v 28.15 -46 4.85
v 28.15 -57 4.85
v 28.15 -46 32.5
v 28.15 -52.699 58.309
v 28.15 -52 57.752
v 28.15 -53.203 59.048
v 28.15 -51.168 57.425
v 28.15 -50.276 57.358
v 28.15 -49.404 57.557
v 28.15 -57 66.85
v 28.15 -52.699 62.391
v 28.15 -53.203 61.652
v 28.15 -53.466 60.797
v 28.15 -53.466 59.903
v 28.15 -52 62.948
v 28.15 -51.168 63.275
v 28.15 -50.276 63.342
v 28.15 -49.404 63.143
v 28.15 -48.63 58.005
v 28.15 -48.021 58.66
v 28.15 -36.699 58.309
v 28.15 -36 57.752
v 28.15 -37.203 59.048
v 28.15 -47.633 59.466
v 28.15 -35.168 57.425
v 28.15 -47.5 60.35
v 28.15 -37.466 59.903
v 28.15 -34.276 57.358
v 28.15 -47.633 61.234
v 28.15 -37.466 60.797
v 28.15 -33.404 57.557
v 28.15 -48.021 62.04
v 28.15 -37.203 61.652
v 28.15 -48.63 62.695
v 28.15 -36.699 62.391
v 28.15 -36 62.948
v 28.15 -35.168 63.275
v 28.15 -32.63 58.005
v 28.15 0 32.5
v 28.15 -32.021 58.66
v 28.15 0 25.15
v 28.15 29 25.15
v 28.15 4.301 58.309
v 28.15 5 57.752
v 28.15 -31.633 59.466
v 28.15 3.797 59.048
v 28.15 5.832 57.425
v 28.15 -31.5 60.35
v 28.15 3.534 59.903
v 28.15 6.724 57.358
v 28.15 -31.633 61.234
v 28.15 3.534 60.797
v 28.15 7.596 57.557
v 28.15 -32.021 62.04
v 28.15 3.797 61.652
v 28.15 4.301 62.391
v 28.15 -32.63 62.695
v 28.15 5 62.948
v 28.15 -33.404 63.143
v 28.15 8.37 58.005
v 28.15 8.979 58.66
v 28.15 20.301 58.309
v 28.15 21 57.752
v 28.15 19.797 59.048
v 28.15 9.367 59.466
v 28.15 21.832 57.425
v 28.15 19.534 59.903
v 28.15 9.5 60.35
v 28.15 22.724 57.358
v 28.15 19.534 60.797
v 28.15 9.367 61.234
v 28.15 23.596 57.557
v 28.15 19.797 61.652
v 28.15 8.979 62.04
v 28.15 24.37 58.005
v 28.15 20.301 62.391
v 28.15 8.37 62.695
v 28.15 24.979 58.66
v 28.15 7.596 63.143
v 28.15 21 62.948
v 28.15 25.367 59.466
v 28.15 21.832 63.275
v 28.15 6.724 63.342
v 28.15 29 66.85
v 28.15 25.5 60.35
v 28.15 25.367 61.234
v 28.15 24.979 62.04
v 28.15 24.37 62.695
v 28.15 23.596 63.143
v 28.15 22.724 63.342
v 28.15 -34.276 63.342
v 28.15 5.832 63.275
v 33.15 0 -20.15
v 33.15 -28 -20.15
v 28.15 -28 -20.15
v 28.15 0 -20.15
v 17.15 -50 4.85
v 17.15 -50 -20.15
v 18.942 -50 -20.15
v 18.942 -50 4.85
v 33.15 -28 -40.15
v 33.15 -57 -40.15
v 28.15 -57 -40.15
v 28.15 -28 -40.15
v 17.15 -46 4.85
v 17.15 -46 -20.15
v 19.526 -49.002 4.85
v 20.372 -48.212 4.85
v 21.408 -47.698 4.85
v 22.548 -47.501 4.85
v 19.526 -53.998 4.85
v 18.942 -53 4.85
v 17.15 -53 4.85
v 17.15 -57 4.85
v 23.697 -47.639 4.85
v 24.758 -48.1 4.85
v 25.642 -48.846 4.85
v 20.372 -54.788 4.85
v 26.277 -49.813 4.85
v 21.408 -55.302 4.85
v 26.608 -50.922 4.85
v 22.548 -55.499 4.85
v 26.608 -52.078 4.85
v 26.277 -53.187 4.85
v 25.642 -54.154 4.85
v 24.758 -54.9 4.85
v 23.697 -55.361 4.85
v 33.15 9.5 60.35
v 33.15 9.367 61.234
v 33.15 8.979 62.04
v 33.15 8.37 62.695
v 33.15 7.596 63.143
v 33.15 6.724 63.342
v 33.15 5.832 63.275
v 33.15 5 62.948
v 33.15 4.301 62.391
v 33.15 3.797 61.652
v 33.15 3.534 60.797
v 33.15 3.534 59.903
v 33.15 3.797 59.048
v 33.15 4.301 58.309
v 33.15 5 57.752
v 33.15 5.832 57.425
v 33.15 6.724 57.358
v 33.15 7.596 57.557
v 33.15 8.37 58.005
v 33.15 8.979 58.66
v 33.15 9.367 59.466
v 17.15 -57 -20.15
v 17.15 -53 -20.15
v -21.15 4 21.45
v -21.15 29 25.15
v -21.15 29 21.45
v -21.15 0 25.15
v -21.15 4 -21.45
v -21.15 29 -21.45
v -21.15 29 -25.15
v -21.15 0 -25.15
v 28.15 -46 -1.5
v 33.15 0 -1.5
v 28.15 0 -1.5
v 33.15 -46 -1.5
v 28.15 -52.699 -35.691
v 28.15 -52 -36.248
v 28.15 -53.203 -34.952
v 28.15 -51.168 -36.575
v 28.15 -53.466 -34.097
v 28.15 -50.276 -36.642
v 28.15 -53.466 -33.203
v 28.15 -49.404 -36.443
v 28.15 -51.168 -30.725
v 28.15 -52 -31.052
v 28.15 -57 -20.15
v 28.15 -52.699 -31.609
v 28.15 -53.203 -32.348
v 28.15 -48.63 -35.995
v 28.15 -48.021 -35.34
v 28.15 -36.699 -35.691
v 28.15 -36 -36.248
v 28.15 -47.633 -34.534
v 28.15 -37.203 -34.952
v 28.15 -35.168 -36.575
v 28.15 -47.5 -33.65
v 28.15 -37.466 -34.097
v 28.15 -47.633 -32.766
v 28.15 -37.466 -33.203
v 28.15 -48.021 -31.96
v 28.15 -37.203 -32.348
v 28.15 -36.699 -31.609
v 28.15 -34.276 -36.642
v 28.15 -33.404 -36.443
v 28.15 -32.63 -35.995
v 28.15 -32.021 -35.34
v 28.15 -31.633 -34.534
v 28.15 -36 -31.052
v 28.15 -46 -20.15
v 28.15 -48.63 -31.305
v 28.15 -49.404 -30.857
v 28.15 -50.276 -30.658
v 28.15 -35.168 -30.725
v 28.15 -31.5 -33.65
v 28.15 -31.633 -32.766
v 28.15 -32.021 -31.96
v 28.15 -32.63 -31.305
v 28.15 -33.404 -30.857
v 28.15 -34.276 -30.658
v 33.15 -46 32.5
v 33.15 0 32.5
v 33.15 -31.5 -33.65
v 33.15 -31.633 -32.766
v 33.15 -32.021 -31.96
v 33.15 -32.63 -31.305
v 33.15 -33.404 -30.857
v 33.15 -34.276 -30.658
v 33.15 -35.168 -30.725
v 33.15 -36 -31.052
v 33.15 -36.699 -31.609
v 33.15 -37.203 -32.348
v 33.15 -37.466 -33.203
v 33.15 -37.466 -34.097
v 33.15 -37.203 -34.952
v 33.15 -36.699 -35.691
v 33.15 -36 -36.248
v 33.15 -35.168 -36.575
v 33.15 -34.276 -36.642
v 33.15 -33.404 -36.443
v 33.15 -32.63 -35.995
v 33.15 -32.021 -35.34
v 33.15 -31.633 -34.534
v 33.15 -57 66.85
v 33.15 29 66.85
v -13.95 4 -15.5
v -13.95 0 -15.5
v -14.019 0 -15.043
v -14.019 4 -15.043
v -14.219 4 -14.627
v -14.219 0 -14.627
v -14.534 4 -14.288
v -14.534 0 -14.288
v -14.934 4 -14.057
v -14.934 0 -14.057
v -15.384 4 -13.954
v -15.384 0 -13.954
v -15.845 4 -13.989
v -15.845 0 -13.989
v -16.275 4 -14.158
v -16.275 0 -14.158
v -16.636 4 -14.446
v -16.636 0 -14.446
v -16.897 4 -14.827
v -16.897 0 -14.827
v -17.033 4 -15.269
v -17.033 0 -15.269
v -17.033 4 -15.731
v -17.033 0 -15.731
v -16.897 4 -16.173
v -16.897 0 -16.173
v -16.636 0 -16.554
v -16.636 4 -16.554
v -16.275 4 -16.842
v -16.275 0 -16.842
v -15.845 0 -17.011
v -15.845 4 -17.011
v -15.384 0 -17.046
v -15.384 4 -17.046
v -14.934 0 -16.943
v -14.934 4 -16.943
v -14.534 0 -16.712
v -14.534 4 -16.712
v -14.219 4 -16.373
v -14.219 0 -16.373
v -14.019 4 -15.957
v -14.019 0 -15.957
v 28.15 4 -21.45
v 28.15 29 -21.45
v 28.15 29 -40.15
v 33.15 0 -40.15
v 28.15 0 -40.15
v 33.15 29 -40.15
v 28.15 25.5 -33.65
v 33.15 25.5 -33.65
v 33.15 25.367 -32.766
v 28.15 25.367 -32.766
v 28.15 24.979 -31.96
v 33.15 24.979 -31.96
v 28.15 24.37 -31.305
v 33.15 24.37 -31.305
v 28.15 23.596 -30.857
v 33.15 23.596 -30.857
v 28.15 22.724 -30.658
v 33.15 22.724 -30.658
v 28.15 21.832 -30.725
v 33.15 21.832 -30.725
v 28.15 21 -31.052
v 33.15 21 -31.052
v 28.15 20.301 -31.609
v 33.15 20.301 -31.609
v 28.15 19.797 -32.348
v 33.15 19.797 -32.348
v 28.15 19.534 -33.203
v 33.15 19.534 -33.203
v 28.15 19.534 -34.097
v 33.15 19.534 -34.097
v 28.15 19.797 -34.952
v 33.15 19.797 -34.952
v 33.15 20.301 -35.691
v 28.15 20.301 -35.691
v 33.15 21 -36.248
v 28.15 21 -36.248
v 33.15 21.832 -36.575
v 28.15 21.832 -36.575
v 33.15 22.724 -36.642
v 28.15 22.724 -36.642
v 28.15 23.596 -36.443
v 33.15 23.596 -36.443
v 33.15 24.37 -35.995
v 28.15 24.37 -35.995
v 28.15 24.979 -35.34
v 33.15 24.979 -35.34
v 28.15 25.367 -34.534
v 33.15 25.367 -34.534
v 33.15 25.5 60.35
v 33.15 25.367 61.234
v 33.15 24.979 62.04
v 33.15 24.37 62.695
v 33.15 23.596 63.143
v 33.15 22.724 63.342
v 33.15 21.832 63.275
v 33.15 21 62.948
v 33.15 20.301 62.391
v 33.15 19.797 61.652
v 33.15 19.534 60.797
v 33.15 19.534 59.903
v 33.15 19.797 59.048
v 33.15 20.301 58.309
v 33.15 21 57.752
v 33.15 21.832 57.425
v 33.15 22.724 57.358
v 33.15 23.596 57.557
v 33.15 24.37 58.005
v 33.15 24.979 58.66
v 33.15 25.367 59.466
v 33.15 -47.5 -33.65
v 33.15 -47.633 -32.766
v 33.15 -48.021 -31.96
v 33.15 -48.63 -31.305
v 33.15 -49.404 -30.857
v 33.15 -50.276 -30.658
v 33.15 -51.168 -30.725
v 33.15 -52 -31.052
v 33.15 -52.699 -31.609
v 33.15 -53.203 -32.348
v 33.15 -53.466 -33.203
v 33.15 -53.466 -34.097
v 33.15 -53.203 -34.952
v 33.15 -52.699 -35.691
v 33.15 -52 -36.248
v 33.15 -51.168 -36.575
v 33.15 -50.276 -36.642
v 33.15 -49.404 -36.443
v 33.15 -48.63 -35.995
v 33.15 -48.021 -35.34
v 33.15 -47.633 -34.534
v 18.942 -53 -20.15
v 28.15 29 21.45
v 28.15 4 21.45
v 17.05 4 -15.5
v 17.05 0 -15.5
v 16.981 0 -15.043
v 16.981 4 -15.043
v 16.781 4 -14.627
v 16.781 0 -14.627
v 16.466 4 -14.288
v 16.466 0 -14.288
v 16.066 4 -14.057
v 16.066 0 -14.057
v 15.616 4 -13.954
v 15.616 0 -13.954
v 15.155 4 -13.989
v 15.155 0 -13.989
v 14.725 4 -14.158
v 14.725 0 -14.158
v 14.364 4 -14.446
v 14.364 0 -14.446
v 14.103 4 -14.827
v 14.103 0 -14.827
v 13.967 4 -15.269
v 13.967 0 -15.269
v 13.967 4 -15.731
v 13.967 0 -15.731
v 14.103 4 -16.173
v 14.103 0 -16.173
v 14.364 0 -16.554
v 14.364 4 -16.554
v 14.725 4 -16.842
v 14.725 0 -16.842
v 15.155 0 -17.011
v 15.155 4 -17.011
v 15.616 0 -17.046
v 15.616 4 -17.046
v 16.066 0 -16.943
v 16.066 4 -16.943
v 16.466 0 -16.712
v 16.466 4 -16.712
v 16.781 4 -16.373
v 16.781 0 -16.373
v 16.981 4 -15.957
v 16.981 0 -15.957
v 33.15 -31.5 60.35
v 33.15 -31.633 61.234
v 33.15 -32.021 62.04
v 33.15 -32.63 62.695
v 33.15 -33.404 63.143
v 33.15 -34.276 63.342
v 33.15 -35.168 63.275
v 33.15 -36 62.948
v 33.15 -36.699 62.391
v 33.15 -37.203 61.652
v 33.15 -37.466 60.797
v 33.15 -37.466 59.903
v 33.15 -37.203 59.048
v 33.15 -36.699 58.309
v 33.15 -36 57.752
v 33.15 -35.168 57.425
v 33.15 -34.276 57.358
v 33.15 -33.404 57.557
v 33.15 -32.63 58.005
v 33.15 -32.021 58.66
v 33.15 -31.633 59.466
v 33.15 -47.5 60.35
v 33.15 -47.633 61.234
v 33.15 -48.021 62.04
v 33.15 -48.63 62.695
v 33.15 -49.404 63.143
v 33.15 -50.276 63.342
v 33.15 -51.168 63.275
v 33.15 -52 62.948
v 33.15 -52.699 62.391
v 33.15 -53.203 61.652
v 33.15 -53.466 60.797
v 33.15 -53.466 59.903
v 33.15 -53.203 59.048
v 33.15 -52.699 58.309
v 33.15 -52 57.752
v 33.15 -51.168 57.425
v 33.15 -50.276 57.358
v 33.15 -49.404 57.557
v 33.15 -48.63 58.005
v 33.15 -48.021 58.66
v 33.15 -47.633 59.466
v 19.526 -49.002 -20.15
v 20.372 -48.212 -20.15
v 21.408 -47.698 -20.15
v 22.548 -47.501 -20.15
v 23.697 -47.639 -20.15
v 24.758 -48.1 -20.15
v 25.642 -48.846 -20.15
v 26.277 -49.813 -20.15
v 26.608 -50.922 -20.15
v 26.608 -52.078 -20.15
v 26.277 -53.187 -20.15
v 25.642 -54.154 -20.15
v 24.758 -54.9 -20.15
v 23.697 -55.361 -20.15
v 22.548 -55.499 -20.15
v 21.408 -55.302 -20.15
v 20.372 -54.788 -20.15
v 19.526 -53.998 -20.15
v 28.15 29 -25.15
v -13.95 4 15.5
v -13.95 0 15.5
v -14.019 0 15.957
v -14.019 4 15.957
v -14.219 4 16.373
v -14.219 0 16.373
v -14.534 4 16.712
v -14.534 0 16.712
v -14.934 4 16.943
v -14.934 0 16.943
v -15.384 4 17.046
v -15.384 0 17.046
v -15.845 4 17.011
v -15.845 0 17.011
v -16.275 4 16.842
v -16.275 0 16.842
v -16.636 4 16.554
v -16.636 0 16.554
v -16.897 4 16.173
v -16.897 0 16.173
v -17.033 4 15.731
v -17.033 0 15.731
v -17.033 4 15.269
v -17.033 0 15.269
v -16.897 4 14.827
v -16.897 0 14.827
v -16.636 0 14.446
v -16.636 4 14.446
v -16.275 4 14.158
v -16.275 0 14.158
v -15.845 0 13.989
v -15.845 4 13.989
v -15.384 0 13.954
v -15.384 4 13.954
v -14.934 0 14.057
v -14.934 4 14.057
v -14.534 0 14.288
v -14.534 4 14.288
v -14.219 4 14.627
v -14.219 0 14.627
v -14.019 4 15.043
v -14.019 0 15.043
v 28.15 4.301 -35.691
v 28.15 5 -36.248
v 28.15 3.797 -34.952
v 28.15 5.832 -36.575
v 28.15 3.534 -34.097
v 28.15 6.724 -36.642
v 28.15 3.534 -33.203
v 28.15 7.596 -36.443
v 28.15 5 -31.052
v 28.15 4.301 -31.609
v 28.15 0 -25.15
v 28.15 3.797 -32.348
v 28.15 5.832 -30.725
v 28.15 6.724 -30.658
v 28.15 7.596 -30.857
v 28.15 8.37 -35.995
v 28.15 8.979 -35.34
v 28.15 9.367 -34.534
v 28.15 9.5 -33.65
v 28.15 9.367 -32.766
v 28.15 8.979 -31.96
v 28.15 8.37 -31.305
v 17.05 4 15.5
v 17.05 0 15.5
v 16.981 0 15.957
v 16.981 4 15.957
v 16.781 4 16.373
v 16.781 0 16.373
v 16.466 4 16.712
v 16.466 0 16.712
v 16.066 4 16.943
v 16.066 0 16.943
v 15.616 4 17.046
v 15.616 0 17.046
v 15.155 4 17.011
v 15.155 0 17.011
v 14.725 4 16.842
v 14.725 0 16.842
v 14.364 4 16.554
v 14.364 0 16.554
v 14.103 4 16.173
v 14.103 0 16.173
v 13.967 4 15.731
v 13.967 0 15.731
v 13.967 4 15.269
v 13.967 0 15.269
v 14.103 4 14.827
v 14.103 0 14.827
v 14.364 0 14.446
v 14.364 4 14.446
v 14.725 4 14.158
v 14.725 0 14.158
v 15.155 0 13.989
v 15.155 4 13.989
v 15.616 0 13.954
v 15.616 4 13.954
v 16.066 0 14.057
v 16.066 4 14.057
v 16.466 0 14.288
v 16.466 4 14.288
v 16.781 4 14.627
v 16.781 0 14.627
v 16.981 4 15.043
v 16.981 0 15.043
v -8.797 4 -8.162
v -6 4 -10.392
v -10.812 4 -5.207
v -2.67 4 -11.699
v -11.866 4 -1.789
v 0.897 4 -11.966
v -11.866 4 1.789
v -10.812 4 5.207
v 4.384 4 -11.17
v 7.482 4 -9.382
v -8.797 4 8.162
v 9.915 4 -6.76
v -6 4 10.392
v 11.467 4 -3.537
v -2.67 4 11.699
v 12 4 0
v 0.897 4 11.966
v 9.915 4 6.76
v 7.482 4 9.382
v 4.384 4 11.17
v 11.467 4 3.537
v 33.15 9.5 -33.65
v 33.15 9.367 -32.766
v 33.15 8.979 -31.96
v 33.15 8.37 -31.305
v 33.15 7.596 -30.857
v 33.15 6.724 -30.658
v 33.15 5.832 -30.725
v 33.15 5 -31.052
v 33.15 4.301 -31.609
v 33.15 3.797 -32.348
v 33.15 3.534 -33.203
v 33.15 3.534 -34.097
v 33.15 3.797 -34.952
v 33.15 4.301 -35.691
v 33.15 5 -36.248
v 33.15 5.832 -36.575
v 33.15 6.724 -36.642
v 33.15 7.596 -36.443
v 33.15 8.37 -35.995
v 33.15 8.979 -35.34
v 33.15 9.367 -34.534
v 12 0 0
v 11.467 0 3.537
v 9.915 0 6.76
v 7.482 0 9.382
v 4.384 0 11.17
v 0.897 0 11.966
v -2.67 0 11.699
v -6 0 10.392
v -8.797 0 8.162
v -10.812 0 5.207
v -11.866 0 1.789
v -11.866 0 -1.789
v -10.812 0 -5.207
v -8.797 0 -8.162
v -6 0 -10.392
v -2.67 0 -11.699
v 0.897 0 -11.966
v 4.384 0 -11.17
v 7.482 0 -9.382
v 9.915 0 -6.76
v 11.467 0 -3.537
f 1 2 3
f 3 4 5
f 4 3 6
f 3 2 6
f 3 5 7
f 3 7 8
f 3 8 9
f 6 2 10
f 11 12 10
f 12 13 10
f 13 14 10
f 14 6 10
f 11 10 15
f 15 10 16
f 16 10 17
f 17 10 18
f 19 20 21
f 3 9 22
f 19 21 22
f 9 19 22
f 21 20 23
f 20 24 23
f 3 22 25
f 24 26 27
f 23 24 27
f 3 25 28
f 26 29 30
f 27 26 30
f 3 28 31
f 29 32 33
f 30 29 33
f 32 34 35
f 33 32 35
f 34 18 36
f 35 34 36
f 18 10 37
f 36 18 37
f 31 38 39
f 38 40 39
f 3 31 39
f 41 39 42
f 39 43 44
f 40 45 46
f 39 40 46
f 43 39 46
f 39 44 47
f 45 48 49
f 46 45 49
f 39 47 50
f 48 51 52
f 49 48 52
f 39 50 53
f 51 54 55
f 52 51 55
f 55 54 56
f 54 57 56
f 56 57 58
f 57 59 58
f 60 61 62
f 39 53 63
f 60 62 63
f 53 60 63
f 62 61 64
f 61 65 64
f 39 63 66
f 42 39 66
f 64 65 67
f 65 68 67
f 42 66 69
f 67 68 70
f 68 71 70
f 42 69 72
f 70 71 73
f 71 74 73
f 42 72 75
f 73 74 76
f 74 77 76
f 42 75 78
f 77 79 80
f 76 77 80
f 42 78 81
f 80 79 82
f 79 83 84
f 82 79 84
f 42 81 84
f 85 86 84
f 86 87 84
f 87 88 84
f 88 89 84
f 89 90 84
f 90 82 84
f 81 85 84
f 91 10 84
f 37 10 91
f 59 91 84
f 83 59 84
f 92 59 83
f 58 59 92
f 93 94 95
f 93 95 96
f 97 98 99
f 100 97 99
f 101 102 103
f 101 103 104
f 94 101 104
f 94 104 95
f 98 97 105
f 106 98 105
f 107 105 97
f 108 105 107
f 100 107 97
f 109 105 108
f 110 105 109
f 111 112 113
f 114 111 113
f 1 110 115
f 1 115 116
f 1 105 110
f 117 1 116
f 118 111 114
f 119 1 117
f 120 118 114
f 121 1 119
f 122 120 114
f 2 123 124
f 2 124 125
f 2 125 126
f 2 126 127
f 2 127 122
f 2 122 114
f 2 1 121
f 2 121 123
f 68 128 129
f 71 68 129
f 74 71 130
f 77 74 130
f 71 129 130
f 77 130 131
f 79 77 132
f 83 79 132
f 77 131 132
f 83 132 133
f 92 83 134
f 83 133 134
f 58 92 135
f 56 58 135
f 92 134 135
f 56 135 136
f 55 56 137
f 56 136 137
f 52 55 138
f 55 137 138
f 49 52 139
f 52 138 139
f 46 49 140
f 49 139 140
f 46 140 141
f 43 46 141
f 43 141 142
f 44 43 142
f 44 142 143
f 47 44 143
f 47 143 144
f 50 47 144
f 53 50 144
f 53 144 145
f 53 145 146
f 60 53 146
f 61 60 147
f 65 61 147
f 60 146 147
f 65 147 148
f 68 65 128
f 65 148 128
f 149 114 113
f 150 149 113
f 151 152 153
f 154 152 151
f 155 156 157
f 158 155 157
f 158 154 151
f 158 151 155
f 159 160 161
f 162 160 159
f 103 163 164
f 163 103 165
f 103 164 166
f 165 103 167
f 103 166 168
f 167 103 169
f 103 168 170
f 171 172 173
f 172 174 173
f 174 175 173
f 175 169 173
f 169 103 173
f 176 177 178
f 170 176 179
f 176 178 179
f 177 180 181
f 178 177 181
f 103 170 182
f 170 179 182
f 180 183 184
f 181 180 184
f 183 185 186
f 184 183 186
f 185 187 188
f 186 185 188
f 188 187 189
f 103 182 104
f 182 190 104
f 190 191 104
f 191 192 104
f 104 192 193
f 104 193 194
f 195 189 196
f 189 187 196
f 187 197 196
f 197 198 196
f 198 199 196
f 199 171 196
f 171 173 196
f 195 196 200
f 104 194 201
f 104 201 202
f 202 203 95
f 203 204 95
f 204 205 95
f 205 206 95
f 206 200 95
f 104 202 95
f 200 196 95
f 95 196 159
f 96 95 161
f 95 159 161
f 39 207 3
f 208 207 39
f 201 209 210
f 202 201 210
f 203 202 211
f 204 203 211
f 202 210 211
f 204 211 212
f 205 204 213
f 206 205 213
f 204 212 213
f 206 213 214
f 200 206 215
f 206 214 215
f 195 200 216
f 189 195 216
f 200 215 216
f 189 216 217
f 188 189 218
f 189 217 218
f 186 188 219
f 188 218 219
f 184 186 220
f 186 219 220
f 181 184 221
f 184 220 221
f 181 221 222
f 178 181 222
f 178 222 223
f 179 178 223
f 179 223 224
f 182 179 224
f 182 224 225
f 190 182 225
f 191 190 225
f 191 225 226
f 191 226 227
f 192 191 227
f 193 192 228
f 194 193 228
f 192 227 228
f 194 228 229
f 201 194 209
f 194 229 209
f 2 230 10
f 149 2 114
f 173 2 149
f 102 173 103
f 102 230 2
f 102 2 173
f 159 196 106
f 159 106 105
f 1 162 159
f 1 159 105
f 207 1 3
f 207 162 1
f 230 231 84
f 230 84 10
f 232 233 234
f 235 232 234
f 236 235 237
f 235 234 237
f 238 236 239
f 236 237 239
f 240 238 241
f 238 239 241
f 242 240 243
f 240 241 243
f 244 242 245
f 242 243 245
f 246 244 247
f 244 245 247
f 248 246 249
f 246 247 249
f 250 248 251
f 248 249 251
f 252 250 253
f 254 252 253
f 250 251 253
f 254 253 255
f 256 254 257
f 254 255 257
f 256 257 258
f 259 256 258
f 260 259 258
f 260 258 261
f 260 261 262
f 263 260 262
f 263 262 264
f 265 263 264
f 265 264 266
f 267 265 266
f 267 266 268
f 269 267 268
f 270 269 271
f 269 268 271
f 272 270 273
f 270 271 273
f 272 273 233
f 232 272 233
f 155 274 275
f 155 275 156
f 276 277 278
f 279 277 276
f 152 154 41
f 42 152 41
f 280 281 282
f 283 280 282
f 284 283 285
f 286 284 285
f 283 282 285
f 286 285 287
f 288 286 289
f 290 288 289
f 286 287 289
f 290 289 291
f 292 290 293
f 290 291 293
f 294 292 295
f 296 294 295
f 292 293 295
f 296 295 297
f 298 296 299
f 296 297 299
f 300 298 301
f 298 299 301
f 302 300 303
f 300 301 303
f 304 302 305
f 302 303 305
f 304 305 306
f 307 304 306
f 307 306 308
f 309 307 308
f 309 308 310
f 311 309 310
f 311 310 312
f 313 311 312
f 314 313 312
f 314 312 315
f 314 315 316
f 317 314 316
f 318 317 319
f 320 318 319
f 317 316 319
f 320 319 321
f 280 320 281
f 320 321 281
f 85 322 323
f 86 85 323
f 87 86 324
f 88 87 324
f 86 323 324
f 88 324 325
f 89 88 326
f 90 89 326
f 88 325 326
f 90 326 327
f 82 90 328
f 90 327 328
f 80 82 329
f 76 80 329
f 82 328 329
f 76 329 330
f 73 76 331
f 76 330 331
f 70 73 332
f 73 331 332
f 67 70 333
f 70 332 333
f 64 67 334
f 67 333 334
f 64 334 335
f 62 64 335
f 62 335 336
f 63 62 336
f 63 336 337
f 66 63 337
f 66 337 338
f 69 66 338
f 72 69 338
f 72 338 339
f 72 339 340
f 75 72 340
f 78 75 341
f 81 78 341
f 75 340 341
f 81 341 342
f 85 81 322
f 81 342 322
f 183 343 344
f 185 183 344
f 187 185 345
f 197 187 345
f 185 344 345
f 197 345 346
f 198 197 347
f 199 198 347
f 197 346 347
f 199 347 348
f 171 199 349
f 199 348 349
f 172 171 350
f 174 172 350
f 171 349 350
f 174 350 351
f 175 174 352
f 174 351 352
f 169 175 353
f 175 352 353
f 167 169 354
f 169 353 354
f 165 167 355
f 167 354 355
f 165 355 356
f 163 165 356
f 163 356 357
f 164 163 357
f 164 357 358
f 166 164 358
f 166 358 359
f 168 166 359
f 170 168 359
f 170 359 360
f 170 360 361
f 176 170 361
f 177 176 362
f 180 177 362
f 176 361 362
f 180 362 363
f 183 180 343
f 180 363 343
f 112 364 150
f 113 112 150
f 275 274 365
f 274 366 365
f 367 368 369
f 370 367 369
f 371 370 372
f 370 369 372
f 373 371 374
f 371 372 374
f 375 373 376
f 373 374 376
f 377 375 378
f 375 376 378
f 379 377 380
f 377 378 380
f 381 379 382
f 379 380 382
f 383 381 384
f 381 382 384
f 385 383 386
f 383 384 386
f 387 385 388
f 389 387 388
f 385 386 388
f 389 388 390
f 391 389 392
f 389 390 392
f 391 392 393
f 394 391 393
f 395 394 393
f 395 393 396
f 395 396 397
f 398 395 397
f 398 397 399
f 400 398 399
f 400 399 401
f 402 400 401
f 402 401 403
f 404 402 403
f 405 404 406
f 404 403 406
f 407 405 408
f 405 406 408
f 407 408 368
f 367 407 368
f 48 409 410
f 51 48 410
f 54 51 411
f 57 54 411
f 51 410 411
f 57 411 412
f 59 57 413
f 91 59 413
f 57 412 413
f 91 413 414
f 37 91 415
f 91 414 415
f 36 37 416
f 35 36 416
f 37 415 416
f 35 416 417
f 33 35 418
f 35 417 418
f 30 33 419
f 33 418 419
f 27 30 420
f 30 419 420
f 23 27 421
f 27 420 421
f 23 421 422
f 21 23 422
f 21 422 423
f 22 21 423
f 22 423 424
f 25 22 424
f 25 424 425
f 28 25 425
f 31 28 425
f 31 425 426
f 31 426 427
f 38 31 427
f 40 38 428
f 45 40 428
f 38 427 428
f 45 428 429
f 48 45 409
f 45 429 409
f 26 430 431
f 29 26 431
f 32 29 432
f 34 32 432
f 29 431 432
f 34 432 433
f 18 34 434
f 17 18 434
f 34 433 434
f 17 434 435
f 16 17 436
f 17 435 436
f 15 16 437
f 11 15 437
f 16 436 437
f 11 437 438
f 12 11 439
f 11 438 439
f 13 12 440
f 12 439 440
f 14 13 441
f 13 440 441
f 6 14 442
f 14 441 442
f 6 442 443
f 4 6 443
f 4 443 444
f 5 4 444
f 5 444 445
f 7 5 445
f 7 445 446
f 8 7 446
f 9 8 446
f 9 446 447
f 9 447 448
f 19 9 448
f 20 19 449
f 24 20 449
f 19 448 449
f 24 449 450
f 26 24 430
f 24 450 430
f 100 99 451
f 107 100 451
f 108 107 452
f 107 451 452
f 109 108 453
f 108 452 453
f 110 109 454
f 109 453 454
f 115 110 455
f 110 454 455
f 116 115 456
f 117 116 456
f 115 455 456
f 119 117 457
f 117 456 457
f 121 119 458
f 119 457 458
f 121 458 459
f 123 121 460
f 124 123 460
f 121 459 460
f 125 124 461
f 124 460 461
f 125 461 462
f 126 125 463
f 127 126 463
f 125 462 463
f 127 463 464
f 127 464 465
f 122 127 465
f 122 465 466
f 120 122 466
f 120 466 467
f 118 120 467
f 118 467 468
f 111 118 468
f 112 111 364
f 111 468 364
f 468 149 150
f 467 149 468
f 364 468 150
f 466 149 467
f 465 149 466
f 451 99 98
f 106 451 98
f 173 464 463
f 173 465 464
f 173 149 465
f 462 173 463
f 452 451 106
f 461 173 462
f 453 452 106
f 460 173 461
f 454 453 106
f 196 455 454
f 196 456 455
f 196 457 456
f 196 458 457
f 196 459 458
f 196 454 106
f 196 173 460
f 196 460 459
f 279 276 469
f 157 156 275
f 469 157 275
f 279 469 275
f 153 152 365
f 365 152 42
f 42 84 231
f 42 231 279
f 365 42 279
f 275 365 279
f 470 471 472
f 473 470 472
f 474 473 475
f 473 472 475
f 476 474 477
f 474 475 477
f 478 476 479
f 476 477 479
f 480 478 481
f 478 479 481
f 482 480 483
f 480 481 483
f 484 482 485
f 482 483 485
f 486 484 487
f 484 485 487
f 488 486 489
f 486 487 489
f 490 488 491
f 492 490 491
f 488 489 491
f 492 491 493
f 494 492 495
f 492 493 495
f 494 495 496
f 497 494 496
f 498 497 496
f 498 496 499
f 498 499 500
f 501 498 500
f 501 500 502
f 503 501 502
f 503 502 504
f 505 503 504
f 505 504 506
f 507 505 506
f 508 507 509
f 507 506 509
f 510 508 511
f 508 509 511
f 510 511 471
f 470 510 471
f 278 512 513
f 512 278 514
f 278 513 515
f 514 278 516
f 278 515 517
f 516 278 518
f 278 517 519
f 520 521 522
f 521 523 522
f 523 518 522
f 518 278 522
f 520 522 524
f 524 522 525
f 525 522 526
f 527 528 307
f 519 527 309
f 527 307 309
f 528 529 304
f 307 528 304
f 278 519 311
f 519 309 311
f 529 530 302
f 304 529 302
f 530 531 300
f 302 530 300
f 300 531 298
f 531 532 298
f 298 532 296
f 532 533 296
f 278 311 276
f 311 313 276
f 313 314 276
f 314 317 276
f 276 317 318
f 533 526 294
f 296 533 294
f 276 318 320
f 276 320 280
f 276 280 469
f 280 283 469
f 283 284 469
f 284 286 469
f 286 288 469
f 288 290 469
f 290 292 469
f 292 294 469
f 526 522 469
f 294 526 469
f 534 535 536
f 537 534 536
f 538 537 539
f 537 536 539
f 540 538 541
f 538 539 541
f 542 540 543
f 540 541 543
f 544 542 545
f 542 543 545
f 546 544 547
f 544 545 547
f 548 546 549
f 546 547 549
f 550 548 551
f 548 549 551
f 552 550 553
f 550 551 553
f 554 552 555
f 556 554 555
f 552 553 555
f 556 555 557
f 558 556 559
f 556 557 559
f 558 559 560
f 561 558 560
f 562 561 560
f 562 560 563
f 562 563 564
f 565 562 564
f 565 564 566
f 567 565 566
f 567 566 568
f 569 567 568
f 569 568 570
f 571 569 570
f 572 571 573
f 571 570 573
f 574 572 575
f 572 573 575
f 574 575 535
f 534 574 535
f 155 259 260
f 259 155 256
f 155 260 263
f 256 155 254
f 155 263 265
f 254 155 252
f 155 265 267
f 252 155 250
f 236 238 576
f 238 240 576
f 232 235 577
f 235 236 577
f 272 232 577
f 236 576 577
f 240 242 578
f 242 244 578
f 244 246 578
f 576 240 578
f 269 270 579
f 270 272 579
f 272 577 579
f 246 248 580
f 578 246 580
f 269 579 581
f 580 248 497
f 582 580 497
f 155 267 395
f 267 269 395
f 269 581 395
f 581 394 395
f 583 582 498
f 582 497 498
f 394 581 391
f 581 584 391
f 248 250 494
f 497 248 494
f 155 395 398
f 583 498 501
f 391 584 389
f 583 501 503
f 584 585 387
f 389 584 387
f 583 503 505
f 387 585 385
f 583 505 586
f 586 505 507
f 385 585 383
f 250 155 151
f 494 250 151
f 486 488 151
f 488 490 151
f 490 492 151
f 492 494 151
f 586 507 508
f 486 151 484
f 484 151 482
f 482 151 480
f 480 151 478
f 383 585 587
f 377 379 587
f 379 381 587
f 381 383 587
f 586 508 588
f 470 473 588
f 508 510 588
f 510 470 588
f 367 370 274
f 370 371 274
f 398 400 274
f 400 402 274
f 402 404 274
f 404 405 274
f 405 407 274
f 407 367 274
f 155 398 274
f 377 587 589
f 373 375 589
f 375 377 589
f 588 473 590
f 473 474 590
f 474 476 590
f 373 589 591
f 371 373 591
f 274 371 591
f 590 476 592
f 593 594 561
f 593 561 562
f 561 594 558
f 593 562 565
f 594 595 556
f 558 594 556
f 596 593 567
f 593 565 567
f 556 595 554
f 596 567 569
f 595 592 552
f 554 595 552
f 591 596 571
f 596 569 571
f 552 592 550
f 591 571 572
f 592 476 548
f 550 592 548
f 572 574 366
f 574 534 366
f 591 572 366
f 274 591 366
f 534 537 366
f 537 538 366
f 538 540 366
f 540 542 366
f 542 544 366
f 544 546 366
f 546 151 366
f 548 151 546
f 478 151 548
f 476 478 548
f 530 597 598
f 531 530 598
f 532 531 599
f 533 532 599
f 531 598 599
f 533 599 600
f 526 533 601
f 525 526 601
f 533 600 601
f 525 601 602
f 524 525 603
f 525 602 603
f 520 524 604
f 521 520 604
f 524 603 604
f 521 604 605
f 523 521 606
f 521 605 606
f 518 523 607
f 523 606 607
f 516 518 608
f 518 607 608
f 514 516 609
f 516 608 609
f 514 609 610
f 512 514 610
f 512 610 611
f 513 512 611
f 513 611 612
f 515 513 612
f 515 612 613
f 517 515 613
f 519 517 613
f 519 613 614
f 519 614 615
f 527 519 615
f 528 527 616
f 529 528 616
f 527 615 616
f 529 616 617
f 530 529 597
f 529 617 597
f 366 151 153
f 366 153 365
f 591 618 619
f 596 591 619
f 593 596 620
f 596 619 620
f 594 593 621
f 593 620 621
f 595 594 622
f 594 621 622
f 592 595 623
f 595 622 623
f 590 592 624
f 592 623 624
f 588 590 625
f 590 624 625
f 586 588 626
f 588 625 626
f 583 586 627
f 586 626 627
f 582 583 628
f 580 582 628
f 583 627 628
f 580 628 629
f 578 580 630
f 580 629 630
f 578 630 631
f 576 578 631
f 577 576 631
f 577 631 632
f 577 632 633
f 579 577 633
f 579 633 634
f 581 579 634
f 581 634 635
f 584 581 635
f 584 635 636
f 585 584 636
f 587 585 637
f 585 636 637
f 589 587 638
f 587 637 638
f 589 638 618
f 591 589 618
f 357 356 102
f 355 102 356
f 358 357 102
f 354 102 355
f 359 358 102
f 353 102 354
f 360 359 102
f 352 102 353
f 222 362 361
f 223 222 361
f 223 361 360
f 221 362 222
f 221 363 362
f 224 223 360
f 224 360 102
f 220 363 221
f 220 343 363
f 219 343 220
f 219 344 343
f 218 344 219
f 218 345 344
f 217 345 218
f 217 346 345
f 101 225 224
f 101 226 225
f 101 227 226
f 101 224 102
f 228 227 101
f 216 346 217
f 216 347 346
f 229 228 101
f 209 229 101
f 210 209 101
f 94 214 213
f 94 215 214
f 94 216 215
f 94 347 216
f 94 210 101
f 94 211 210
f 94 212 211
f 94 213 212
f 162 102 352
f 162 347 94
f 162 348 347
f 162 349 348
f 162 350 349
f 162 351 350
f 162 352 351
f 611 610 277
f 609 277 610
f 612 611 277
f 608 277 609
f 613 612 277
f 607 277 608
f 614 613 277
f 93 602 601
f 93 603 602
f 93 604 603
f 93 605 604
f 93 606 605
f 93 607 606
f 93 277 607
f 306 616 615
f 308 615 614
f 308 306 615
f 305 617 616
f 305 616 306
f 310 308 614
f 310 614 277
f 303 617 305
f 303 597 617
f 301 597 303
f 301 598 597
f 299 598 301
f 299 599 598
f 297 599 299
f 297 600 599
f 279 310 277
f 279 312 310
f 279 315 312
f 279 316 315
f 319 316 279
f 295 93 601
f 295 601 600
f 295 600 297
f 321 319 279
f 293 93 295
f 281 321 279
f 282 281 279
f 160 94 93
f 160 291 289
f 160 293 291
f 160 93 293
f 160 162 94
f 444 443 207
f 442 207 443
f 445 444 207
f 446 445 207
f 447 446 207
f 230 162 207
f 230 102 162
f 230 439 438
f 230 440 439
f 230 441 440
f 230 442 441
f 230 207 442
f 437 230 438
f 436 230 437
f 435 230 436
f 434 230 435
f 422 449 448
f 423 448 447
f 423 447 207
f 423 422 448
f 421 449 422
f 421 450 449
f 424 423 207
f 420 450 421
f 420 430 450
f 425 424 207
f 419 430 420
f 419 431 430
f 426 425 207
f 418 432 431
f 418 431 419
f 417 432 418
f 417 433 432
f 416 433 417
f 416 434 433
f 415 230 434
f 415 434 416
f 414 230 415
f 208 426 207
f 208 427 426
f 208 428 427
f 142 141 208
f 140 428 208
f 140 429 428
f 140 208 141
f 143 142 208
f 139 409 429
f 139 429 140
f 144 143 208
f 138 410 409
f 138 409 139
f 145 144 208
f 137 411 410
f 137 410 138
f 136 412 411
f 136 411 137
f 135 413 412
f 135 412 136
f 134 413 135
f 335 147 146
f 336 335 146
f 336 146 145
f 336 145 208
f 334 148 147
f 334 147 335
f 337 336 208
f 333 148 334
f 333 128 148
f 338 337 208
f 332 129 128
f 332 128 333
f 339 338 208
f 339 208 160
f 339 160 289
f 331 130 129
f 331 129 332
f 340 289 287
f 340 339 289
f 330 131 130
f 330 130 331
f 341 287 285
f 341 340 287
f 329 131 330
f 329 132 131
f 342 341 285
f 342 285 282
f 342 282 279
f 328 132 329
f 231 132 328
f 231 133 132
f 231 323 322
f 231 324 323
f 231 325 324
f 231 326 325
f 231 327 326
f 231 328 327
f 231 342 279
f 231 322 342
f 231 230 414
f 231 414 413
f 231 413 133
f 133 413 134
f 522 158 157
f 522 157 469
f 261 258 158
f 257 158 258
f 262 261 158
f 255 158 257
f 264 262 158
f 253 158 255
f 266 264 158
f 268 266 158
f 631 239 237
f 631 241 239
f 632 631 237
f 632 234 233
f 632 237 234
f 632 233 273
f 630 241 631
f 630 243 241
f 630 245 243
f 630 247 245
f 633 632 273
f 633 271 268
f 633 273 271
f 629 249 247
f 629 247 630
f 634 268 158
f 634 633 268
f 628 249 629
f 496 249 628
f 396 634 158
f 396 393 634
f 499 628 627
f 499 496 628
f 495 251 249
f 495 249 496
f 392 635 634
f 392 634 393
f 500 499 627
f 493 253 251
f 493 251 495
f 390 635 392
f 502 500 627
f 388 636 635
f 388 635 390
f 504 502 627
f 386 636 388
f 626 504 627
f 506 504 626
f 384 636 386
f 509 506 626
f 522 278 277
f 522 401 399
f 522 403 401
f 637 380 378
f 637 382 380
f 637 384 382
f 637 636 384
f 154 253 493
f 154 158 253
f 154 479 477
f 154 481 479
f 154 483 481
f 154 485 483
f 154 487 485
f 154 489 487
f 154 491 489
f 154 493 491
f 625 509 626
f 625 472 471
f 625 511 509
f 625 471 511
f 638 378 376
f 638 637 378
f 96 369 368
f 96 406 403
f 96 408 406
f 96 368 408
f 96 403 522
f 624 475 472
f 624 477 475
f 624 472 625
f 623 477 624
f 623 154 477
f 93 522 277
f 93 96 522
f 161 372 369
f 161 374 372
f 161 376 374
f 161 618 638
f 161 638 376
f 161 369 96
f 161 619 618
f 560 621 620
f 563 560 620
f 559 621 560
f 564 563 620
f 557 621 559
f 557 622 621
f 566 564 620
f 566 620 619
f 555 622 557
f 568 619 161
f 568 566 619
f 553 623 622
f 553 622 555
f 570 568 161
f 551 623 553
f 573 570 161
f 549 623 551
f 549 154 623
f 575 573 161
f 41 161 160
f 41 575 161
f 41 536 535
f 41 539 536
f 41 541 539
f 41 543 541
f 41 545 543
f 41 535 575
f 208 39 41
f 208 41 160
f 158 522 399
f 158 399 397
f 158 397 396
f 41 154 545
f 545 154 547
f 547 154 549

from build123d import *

# Parameters (mm, degrees)
F2_R      = 1.55
F2_R_2    = 12
F4_DEPTH  = 4
F3_R      = 3
F5_DEPTH  = 5
F6_DEPTH  = 16
F2_W      = 50.3
F2_H      = 3.7
F8_DEPTH  = 29
F10_DEPTH = 25


with BuildPart() as f4:
    # F2 (on Front) → F4 (new body)
    with BuildSketch(Plane.XZ):
        Polygon((29.15, -21.45), (29.15, 21.45), (-21.15, 21.45), (-21.15, 21.15), (-21.15, -21.45), (21.45, -21.45), align=None)
        with Locations((-15.5, -15.5)):
            Circle(F2_R, mode=Mode.SUBTRACT)
        Circle(F2_R_2, mode=Mode.SUBTRACT)
        with Locations((15.5, -15.5)):
            Circle(F2_R, mode=Mode.SUBTRACT)
        with Locations((-15.5, 15.5)):
            Circle(F2_R, mode=Mode.SUBTRACT)
        with Locations((15.5, 15.5)):
            Circle(F2_R, mode=Mode.SUBTRACT)
    extrude(amount=-F4_DEPTH)



with BuildPart() as f5:
    # F3 (on Right) → F5 (new body)
    with BuildSketch(Plane.YZ):
        Polygon((29, 66.85), (0, 66.85), (-57, 66.85), (-57, 40.85), (-57, 4.85), (-46, 4.85), (-46, 32.5), (0, 32.5), (0, 0), (0, -1.5), (-46, -1.5), (-46, -20.15), (-28, -20.15), (0, -20.15), (0, -40.15), (29, -40.15), align=None)
        with Locations((6.5, -33.65)):
            Circle(F3_R, mode=Mode.SUBTRACT)
        with Locations((22.5, -33.65)):
            Circle(F3_R, mode=Mode.SUBTRACT)
        with Locations((-50.5, 60.35)):
            Circle(F3_R, mode=Mode.SUBTRACT)
        with Locations((-34.5, 60.35)):
            Circle(F3_R, mode=Mode.SUBTRACT)
        with Locations((6.5, 60.35)):
            Circle(F3_R, mode=Mode.SUBTRACT)
        with Locations((22.5, 60.35)):
            Circle(F3_R, mode=Mode.SUBTRACT)
        Polygon((-46, 4.85), (-57, 4.85), (-57, -20.15), (-46, -20.15), (-46, -1.5), align=None)
        Polygon((-46, -20.15), (-57, -20.15), (-57, -40.15), (-28, -40.15), (-28, -20.15), align=None)
        with Locations((-50.5, -33.65)):
            Circle(F3_R, mode=Mode.SUBTRACT)
        with Locations((-34.5, -33.65)):
            Circle(F3_R, mode=Mode.SUBTRACT)
    extrude(amount=-F5_DEPTH)

    # F3 (on Right) → F6 (join)
    with BuildSketch(Plane.YZ):
        Polygon((-46, 4.85), (-57, 4.85), (-57, -20.15), (-46, -20.15), (-46, -1.5), align=None)
    extrude(amount=-F6_DEPTH)


with BuildPart() as f5_1:
    # F7: moved
    add(f5.part.moved(Location((33.15, 0, 0))))


with BuildPart() as f4_1:
    add(f4.part)

    add(f5_1.part)  # F8 merges F5
    # F2 (on Front) → F8 (join, through all)
    with BuildSketch(Plane.XZ):
        Polygon((-21.15, -25.15), (29.15, -25.15), (29.15, -21.45), (21.45, -21.45), (-21.15, -21.45), align=None)
        with Locations((4, 23.3)):
            Rectangle(F2_W, F2_H)
    extrude(amount=-F8_DEPTH)

    # F9 (on face) → F10 (cut, through all)
    with BuildSketch(Plane(origin=(0, 0, -20.15), x_dir=(1, 0, 0), z_dir=(0, 0, -1))):
        with BuildLine():
            Line((9.1694937954, 50), (18.9419007565, 50))
            ThreePointArc((18.9419007565, 50), (26.65, 51.5), (18.9419007565, 53))
            Line((18.9419007565, 53), (9.1694937954, 53))
            Line((9.1694937954, 53), (9.1694937954, 50))
        make_face()
    extrude(amount=-F10_DEPTH, mode=Mode.SUBTRACT)


solid = f4_1.part
